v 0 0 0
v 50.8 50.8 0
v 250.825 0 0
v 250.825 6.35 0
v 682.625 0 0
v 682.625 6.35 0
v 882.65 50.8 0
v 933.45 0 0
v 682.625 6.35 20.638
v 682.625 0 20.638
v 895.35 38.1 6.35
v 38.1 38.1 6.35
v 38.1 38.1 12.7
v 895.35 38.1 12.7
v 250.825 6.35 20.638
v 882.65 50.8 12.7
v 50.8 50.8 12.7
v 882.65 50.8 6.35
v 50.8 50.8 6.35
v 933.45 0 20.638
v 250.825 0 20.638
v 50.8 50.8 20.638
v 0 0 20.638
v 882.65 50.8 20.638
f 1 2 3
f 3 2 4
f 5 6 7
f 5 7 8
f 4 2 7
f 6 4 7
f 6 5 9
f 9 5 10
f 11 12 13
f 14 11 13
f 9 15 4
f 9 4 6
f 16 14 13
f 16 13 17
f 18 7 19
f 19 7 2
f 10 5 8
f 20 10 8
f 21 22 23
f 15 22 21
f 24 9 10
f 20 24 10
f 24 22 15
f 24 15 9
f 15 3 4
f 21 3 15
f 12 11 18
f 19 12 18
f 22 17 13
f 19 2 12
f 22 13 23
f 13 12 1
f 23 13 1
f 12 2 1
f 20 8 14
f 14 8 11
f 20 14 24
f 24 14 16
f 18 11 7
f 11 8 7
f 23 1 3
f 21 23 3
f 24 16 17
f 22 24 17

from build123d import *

# Parameters (mm, degrees)
F1_DEPTH = 20.6375
F2_W     = 12.7
F2_H     = 6.35
F3_DEPTH = 933.451
F4_W     = 431.8
F4_H     = 20.6375
F5_DEPTH = 6.35


with BuildPart() as f1:
    # F0 (on Top) → F1 (new body)
    with BuildSketch(Plane.XY):
        Polygon((50.8, 50.8), (0, 0), (933.45, 0), (882.65, 50.8), align=None)
    extrude(amount=F1_DEPTH)

    # F2 (on Right) → F3 (cut, through all)
    with BuildSketch(Plane.YZ):
        with Locations((44.45, 9.525)):
            Rectangle(F2_W, F2_H)
    extrude(amount=F3_DEPTH, mode=Mode.SUBTRACT)

    # F4 (on face) → F5 (cut)
    with BuildSketch(Plane.XZ):
        with Locations((466.725, 10.31875)):
            Rectangle(F4_W, F4_H)
    extrude(amount=-F5_DEPTH, mode=Mode.SUBTRACT)


solid = f1.part
